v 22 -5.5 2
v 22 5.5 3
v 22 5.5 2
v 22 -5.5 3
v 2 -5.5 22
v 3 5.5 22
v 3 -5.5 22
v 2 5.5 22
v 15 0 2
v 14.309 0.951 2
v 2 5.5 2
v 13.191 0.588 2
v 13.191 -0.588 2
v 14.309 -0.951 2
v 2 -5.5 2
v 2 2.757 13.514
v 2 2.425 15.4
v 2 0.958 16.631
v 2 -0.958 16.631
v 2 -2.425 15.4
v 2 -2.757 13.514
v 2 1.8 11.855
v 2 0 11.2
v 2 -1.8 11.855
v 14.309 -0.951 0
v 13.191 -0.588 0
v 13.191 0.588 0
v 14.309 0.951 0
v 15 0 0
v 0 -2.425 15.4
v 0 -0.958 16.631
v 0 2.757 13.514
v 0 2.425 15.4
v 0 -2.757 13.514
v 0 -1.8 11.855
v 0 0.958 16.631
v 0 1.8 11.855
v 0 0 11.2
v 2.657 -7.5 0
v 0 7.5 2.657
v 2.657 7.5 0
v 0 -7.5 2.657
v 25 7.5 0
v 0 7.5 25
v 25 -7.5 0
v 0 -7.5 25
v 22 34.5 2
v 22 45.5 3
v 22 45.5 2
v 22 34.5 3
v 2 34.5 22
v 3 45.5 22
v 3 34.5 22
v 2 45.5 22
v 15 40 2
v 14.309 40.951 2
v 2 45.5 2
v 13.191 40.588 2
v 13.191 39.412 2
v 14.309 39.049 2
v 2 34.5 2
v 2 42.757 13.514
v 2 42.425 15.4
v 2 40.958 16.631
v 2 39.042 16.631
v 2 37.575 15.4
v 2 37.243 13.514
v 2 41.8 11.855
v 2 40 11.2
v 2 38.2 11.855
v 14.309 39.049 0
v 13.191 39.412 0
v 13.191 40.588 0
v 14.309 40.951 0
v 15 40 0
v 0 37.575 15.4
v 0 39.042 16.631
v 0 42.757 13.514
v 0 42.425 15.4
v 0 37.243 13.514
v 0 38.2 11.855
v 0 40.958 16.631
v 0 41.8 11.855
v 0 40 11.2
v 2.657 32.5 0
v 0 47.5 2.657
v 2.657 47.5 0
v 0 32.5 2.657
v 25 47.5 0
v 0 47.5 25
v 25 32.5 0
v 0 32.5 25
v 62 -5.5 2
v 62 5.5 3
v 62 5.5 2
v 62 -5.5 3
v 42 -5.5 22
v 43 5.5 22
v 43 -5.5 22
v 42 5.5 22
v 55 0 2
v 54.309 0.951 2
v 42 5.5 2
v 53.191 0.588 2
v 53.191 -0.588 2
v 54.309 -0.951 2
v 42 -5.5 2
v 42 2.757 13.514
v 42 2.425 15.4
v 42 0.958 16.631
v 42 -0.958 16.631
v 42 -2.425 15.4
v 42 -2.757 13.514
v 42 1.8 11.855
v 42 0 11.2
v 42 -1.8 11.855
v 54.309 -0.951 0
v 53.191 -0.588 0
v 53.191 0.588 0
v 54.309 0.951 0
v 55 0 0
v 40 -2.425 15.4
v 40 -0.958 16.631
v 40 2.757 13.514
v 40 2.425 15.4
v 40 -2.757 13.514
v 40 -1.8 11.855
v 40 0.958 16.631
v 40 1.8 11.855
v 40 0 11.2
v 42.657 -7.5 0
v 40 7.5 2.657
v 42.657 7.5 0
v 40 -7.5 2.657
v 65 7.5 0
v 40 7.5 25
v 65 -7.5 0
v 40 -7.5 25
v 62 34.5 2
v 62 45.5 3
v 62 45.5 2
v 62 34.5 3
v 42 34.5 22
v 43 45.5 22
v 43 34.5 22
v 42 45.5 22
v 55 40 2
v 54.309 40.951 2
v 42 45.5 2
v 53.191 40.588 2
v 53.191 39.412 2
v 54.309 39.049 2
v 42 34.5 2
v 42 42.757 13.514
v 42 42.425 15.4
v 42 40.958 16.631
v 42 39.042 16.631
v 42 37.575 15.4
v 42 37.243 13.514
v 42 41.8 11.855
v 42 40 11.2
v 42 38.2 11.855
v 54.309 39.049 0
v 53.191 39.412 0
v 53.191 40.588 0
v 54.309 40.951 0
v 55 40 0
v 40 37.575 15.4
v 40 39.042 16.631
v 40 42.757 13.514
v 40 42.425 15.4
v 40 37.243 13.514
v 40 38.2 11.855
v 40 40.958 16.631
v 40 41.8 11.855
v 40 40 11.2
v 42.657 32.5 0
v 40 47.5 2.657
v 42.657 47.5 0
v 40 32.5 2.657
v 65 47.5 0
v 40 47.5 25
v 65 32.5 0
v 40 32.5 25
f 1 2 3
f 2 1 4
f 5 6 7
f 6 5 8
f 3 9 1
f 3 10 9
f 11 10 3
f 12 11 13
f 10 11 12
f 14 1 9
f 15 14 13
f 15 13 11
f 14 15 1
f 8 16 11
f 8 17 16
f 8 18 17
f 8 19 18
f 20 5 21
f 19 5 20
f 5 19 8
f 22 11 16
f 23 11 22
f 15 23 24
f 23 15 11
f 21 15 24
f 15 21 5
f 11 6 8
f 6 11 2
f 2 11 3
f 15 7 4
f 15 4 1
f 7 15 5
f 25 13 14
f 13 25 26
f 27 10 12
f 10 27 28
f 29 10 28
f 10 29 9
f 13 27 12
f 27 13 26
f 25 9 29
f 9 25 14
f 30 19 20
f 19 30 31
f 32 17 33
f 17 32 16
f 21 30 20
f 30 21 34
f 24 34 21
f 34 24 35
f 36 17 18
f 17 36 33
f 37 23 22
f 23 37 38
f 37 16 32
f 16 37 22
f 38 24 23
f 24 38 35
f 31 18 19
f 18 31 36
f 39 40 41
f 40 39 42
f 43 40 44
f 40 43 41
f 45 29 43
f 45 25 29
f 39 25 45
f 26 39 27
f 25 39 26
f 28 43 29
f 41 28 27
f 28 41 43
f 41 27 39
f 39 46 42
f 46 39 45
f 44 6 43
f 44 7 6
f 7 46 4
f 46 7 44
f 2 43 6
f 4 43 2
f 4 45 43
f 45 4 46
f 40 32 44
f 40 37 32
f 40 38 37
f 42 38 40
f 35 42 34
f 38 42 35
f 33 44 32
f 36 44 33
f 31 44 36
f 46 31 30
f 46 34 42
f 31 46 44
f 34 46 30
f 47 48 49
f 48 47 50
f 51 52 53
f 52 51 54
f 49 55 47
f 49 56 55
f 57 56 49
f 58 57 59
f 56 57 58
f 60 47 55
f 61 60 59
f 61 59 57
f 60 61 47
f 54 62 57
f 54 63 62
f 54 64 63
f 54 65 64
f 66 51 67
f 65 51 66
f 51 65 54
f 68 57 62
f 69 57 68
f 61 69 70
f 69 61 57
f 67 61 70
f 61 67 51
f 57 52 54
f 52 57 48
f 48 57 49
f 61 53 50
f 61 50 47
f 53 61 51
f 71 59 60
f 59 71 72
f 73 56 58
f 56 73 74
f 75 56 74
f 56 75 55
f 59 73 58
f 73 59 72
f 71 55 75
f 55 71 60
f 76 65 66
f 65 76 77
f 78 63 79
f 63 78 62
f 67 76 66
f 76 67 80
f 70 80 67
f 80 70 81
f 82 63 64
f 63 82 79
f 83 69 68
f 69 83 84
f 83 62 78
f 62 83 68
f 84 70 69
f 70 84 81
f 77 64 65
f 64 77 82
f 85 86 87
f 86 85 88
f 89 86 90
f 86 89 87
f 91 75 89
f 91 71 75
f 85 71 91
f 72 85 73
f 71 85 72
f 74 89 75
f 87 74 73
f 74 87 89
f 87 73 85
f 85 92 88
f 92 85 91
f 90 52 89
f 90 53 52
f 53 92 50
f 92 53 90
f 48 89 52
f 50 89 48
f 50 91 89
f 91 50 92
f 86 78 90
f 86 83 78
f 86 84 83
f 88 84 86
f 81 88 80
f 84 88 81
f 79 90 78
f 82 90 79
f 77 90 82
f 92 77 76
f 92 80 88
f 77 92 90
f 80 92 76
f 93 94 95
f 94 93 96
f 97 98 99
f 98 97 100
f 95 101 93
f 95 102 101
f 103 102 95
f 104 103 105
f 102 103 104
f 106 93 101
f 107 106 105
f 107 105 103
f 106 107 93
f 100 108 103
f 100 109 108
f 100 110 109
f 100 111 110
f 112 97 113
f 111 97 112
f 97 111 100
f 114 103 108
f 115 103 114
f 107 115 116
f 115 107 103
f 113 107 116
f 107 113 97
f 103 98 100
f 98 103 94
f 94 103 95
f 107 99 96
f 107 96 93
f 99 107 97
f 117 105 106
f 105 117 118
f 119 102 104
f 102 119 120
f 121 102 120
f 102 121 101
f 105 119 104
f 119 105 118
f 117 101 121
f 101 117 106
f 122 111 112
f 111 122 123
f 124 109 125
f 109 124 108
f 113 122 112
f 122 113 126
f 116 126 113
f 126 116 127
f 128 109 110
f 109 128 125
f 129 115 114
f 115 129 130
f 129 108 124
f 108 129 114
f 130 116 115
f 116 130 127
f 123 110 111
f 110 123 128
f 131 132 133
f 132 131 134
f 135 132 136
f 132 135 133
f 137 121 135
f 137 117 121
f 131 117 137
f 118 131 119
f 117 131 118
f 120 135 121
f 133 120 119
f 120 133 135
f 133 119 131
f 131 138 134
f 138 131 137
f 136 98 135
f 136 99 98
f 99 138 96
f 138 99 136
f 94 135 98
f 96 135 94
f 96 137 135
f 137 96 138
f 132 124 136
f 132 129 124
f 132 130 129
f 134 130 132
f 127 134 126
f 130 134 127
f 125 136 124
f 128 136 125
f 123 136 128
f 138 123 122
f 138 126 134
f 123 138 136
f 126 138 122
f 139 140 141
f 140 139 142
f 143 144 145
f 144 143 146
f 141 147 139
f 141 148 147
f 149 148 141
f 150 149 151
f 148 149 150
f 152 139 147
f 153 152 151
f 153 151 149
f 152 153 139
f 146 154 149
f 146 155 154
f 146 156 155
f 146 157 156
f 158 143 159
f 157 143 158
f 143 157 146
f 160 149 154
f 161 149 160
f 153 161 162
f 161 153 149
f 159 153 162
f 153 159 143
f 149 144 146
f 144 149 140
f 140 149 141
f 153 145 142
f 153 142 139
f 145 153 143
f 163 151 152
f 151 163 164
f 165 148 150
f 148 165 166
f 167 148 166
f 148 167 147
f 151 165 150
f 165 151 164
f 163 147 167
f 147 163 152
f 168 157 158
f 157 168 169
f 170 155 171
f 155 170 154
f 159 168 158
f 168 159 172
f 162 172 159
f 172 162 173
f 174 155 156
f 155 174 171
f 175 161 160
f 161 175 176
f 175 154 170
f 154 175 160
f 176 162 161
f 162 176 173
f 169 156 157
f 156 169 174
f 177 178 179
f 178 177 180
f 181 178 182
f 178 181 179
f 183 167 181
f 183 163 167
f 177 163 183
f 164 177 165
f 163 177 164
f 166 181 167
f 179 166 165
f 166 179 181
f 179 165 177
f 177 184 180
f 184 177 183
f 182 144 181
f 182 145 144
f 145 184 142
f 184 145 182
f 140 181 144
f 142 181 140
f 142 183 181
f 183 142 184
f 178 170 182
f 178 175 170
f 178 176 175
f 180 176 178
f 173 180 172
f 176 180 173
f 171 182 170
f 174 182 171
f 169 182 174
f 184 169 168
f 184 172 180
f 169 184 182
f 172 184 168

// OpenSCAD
/*
  Equerre de fixation des montants de l'axe Y
  Projets DIY - 02/20016 - http://www.projetsdiy.fr
  v1
*/

b = 25;  // Profondeur
h = 25;  // Hauteur
w = 15;  // largeur

// Extrusion du triangle
module triangle(){
    rotate(a=[90,0,0])
    linear_extrude(height = w, center = true, convexity = 10, twist = 0)
    polygon(points=[[0,0],[h,0],[0,b]], paths=[[0,1,2]]);
}

// Perçages
module trous(){
    translate([2,-w / 2 + 2,2]) cube([20,w - 4,20]);  
    translate([14,0,-2]) cylinder(r=1,h=10);
    translate([-2,0,14]) rotate([0,90,0]) cylinder(r=2.8,h=10);
    translate([-3,- w / 1.5,0]) rotate([0,45,0]) cube([4,w * 2,4]);
    
}    

// Assemblage de l'equerre
module equerre(){
  difference(){
    triangle();
    trous();
  } 
}   

// Lot d'équerres à imprimer
for (a=[0:40:40]){
    translate([a,0,0]) equerre();
    translate([a,40,0]) equerre();
}    
